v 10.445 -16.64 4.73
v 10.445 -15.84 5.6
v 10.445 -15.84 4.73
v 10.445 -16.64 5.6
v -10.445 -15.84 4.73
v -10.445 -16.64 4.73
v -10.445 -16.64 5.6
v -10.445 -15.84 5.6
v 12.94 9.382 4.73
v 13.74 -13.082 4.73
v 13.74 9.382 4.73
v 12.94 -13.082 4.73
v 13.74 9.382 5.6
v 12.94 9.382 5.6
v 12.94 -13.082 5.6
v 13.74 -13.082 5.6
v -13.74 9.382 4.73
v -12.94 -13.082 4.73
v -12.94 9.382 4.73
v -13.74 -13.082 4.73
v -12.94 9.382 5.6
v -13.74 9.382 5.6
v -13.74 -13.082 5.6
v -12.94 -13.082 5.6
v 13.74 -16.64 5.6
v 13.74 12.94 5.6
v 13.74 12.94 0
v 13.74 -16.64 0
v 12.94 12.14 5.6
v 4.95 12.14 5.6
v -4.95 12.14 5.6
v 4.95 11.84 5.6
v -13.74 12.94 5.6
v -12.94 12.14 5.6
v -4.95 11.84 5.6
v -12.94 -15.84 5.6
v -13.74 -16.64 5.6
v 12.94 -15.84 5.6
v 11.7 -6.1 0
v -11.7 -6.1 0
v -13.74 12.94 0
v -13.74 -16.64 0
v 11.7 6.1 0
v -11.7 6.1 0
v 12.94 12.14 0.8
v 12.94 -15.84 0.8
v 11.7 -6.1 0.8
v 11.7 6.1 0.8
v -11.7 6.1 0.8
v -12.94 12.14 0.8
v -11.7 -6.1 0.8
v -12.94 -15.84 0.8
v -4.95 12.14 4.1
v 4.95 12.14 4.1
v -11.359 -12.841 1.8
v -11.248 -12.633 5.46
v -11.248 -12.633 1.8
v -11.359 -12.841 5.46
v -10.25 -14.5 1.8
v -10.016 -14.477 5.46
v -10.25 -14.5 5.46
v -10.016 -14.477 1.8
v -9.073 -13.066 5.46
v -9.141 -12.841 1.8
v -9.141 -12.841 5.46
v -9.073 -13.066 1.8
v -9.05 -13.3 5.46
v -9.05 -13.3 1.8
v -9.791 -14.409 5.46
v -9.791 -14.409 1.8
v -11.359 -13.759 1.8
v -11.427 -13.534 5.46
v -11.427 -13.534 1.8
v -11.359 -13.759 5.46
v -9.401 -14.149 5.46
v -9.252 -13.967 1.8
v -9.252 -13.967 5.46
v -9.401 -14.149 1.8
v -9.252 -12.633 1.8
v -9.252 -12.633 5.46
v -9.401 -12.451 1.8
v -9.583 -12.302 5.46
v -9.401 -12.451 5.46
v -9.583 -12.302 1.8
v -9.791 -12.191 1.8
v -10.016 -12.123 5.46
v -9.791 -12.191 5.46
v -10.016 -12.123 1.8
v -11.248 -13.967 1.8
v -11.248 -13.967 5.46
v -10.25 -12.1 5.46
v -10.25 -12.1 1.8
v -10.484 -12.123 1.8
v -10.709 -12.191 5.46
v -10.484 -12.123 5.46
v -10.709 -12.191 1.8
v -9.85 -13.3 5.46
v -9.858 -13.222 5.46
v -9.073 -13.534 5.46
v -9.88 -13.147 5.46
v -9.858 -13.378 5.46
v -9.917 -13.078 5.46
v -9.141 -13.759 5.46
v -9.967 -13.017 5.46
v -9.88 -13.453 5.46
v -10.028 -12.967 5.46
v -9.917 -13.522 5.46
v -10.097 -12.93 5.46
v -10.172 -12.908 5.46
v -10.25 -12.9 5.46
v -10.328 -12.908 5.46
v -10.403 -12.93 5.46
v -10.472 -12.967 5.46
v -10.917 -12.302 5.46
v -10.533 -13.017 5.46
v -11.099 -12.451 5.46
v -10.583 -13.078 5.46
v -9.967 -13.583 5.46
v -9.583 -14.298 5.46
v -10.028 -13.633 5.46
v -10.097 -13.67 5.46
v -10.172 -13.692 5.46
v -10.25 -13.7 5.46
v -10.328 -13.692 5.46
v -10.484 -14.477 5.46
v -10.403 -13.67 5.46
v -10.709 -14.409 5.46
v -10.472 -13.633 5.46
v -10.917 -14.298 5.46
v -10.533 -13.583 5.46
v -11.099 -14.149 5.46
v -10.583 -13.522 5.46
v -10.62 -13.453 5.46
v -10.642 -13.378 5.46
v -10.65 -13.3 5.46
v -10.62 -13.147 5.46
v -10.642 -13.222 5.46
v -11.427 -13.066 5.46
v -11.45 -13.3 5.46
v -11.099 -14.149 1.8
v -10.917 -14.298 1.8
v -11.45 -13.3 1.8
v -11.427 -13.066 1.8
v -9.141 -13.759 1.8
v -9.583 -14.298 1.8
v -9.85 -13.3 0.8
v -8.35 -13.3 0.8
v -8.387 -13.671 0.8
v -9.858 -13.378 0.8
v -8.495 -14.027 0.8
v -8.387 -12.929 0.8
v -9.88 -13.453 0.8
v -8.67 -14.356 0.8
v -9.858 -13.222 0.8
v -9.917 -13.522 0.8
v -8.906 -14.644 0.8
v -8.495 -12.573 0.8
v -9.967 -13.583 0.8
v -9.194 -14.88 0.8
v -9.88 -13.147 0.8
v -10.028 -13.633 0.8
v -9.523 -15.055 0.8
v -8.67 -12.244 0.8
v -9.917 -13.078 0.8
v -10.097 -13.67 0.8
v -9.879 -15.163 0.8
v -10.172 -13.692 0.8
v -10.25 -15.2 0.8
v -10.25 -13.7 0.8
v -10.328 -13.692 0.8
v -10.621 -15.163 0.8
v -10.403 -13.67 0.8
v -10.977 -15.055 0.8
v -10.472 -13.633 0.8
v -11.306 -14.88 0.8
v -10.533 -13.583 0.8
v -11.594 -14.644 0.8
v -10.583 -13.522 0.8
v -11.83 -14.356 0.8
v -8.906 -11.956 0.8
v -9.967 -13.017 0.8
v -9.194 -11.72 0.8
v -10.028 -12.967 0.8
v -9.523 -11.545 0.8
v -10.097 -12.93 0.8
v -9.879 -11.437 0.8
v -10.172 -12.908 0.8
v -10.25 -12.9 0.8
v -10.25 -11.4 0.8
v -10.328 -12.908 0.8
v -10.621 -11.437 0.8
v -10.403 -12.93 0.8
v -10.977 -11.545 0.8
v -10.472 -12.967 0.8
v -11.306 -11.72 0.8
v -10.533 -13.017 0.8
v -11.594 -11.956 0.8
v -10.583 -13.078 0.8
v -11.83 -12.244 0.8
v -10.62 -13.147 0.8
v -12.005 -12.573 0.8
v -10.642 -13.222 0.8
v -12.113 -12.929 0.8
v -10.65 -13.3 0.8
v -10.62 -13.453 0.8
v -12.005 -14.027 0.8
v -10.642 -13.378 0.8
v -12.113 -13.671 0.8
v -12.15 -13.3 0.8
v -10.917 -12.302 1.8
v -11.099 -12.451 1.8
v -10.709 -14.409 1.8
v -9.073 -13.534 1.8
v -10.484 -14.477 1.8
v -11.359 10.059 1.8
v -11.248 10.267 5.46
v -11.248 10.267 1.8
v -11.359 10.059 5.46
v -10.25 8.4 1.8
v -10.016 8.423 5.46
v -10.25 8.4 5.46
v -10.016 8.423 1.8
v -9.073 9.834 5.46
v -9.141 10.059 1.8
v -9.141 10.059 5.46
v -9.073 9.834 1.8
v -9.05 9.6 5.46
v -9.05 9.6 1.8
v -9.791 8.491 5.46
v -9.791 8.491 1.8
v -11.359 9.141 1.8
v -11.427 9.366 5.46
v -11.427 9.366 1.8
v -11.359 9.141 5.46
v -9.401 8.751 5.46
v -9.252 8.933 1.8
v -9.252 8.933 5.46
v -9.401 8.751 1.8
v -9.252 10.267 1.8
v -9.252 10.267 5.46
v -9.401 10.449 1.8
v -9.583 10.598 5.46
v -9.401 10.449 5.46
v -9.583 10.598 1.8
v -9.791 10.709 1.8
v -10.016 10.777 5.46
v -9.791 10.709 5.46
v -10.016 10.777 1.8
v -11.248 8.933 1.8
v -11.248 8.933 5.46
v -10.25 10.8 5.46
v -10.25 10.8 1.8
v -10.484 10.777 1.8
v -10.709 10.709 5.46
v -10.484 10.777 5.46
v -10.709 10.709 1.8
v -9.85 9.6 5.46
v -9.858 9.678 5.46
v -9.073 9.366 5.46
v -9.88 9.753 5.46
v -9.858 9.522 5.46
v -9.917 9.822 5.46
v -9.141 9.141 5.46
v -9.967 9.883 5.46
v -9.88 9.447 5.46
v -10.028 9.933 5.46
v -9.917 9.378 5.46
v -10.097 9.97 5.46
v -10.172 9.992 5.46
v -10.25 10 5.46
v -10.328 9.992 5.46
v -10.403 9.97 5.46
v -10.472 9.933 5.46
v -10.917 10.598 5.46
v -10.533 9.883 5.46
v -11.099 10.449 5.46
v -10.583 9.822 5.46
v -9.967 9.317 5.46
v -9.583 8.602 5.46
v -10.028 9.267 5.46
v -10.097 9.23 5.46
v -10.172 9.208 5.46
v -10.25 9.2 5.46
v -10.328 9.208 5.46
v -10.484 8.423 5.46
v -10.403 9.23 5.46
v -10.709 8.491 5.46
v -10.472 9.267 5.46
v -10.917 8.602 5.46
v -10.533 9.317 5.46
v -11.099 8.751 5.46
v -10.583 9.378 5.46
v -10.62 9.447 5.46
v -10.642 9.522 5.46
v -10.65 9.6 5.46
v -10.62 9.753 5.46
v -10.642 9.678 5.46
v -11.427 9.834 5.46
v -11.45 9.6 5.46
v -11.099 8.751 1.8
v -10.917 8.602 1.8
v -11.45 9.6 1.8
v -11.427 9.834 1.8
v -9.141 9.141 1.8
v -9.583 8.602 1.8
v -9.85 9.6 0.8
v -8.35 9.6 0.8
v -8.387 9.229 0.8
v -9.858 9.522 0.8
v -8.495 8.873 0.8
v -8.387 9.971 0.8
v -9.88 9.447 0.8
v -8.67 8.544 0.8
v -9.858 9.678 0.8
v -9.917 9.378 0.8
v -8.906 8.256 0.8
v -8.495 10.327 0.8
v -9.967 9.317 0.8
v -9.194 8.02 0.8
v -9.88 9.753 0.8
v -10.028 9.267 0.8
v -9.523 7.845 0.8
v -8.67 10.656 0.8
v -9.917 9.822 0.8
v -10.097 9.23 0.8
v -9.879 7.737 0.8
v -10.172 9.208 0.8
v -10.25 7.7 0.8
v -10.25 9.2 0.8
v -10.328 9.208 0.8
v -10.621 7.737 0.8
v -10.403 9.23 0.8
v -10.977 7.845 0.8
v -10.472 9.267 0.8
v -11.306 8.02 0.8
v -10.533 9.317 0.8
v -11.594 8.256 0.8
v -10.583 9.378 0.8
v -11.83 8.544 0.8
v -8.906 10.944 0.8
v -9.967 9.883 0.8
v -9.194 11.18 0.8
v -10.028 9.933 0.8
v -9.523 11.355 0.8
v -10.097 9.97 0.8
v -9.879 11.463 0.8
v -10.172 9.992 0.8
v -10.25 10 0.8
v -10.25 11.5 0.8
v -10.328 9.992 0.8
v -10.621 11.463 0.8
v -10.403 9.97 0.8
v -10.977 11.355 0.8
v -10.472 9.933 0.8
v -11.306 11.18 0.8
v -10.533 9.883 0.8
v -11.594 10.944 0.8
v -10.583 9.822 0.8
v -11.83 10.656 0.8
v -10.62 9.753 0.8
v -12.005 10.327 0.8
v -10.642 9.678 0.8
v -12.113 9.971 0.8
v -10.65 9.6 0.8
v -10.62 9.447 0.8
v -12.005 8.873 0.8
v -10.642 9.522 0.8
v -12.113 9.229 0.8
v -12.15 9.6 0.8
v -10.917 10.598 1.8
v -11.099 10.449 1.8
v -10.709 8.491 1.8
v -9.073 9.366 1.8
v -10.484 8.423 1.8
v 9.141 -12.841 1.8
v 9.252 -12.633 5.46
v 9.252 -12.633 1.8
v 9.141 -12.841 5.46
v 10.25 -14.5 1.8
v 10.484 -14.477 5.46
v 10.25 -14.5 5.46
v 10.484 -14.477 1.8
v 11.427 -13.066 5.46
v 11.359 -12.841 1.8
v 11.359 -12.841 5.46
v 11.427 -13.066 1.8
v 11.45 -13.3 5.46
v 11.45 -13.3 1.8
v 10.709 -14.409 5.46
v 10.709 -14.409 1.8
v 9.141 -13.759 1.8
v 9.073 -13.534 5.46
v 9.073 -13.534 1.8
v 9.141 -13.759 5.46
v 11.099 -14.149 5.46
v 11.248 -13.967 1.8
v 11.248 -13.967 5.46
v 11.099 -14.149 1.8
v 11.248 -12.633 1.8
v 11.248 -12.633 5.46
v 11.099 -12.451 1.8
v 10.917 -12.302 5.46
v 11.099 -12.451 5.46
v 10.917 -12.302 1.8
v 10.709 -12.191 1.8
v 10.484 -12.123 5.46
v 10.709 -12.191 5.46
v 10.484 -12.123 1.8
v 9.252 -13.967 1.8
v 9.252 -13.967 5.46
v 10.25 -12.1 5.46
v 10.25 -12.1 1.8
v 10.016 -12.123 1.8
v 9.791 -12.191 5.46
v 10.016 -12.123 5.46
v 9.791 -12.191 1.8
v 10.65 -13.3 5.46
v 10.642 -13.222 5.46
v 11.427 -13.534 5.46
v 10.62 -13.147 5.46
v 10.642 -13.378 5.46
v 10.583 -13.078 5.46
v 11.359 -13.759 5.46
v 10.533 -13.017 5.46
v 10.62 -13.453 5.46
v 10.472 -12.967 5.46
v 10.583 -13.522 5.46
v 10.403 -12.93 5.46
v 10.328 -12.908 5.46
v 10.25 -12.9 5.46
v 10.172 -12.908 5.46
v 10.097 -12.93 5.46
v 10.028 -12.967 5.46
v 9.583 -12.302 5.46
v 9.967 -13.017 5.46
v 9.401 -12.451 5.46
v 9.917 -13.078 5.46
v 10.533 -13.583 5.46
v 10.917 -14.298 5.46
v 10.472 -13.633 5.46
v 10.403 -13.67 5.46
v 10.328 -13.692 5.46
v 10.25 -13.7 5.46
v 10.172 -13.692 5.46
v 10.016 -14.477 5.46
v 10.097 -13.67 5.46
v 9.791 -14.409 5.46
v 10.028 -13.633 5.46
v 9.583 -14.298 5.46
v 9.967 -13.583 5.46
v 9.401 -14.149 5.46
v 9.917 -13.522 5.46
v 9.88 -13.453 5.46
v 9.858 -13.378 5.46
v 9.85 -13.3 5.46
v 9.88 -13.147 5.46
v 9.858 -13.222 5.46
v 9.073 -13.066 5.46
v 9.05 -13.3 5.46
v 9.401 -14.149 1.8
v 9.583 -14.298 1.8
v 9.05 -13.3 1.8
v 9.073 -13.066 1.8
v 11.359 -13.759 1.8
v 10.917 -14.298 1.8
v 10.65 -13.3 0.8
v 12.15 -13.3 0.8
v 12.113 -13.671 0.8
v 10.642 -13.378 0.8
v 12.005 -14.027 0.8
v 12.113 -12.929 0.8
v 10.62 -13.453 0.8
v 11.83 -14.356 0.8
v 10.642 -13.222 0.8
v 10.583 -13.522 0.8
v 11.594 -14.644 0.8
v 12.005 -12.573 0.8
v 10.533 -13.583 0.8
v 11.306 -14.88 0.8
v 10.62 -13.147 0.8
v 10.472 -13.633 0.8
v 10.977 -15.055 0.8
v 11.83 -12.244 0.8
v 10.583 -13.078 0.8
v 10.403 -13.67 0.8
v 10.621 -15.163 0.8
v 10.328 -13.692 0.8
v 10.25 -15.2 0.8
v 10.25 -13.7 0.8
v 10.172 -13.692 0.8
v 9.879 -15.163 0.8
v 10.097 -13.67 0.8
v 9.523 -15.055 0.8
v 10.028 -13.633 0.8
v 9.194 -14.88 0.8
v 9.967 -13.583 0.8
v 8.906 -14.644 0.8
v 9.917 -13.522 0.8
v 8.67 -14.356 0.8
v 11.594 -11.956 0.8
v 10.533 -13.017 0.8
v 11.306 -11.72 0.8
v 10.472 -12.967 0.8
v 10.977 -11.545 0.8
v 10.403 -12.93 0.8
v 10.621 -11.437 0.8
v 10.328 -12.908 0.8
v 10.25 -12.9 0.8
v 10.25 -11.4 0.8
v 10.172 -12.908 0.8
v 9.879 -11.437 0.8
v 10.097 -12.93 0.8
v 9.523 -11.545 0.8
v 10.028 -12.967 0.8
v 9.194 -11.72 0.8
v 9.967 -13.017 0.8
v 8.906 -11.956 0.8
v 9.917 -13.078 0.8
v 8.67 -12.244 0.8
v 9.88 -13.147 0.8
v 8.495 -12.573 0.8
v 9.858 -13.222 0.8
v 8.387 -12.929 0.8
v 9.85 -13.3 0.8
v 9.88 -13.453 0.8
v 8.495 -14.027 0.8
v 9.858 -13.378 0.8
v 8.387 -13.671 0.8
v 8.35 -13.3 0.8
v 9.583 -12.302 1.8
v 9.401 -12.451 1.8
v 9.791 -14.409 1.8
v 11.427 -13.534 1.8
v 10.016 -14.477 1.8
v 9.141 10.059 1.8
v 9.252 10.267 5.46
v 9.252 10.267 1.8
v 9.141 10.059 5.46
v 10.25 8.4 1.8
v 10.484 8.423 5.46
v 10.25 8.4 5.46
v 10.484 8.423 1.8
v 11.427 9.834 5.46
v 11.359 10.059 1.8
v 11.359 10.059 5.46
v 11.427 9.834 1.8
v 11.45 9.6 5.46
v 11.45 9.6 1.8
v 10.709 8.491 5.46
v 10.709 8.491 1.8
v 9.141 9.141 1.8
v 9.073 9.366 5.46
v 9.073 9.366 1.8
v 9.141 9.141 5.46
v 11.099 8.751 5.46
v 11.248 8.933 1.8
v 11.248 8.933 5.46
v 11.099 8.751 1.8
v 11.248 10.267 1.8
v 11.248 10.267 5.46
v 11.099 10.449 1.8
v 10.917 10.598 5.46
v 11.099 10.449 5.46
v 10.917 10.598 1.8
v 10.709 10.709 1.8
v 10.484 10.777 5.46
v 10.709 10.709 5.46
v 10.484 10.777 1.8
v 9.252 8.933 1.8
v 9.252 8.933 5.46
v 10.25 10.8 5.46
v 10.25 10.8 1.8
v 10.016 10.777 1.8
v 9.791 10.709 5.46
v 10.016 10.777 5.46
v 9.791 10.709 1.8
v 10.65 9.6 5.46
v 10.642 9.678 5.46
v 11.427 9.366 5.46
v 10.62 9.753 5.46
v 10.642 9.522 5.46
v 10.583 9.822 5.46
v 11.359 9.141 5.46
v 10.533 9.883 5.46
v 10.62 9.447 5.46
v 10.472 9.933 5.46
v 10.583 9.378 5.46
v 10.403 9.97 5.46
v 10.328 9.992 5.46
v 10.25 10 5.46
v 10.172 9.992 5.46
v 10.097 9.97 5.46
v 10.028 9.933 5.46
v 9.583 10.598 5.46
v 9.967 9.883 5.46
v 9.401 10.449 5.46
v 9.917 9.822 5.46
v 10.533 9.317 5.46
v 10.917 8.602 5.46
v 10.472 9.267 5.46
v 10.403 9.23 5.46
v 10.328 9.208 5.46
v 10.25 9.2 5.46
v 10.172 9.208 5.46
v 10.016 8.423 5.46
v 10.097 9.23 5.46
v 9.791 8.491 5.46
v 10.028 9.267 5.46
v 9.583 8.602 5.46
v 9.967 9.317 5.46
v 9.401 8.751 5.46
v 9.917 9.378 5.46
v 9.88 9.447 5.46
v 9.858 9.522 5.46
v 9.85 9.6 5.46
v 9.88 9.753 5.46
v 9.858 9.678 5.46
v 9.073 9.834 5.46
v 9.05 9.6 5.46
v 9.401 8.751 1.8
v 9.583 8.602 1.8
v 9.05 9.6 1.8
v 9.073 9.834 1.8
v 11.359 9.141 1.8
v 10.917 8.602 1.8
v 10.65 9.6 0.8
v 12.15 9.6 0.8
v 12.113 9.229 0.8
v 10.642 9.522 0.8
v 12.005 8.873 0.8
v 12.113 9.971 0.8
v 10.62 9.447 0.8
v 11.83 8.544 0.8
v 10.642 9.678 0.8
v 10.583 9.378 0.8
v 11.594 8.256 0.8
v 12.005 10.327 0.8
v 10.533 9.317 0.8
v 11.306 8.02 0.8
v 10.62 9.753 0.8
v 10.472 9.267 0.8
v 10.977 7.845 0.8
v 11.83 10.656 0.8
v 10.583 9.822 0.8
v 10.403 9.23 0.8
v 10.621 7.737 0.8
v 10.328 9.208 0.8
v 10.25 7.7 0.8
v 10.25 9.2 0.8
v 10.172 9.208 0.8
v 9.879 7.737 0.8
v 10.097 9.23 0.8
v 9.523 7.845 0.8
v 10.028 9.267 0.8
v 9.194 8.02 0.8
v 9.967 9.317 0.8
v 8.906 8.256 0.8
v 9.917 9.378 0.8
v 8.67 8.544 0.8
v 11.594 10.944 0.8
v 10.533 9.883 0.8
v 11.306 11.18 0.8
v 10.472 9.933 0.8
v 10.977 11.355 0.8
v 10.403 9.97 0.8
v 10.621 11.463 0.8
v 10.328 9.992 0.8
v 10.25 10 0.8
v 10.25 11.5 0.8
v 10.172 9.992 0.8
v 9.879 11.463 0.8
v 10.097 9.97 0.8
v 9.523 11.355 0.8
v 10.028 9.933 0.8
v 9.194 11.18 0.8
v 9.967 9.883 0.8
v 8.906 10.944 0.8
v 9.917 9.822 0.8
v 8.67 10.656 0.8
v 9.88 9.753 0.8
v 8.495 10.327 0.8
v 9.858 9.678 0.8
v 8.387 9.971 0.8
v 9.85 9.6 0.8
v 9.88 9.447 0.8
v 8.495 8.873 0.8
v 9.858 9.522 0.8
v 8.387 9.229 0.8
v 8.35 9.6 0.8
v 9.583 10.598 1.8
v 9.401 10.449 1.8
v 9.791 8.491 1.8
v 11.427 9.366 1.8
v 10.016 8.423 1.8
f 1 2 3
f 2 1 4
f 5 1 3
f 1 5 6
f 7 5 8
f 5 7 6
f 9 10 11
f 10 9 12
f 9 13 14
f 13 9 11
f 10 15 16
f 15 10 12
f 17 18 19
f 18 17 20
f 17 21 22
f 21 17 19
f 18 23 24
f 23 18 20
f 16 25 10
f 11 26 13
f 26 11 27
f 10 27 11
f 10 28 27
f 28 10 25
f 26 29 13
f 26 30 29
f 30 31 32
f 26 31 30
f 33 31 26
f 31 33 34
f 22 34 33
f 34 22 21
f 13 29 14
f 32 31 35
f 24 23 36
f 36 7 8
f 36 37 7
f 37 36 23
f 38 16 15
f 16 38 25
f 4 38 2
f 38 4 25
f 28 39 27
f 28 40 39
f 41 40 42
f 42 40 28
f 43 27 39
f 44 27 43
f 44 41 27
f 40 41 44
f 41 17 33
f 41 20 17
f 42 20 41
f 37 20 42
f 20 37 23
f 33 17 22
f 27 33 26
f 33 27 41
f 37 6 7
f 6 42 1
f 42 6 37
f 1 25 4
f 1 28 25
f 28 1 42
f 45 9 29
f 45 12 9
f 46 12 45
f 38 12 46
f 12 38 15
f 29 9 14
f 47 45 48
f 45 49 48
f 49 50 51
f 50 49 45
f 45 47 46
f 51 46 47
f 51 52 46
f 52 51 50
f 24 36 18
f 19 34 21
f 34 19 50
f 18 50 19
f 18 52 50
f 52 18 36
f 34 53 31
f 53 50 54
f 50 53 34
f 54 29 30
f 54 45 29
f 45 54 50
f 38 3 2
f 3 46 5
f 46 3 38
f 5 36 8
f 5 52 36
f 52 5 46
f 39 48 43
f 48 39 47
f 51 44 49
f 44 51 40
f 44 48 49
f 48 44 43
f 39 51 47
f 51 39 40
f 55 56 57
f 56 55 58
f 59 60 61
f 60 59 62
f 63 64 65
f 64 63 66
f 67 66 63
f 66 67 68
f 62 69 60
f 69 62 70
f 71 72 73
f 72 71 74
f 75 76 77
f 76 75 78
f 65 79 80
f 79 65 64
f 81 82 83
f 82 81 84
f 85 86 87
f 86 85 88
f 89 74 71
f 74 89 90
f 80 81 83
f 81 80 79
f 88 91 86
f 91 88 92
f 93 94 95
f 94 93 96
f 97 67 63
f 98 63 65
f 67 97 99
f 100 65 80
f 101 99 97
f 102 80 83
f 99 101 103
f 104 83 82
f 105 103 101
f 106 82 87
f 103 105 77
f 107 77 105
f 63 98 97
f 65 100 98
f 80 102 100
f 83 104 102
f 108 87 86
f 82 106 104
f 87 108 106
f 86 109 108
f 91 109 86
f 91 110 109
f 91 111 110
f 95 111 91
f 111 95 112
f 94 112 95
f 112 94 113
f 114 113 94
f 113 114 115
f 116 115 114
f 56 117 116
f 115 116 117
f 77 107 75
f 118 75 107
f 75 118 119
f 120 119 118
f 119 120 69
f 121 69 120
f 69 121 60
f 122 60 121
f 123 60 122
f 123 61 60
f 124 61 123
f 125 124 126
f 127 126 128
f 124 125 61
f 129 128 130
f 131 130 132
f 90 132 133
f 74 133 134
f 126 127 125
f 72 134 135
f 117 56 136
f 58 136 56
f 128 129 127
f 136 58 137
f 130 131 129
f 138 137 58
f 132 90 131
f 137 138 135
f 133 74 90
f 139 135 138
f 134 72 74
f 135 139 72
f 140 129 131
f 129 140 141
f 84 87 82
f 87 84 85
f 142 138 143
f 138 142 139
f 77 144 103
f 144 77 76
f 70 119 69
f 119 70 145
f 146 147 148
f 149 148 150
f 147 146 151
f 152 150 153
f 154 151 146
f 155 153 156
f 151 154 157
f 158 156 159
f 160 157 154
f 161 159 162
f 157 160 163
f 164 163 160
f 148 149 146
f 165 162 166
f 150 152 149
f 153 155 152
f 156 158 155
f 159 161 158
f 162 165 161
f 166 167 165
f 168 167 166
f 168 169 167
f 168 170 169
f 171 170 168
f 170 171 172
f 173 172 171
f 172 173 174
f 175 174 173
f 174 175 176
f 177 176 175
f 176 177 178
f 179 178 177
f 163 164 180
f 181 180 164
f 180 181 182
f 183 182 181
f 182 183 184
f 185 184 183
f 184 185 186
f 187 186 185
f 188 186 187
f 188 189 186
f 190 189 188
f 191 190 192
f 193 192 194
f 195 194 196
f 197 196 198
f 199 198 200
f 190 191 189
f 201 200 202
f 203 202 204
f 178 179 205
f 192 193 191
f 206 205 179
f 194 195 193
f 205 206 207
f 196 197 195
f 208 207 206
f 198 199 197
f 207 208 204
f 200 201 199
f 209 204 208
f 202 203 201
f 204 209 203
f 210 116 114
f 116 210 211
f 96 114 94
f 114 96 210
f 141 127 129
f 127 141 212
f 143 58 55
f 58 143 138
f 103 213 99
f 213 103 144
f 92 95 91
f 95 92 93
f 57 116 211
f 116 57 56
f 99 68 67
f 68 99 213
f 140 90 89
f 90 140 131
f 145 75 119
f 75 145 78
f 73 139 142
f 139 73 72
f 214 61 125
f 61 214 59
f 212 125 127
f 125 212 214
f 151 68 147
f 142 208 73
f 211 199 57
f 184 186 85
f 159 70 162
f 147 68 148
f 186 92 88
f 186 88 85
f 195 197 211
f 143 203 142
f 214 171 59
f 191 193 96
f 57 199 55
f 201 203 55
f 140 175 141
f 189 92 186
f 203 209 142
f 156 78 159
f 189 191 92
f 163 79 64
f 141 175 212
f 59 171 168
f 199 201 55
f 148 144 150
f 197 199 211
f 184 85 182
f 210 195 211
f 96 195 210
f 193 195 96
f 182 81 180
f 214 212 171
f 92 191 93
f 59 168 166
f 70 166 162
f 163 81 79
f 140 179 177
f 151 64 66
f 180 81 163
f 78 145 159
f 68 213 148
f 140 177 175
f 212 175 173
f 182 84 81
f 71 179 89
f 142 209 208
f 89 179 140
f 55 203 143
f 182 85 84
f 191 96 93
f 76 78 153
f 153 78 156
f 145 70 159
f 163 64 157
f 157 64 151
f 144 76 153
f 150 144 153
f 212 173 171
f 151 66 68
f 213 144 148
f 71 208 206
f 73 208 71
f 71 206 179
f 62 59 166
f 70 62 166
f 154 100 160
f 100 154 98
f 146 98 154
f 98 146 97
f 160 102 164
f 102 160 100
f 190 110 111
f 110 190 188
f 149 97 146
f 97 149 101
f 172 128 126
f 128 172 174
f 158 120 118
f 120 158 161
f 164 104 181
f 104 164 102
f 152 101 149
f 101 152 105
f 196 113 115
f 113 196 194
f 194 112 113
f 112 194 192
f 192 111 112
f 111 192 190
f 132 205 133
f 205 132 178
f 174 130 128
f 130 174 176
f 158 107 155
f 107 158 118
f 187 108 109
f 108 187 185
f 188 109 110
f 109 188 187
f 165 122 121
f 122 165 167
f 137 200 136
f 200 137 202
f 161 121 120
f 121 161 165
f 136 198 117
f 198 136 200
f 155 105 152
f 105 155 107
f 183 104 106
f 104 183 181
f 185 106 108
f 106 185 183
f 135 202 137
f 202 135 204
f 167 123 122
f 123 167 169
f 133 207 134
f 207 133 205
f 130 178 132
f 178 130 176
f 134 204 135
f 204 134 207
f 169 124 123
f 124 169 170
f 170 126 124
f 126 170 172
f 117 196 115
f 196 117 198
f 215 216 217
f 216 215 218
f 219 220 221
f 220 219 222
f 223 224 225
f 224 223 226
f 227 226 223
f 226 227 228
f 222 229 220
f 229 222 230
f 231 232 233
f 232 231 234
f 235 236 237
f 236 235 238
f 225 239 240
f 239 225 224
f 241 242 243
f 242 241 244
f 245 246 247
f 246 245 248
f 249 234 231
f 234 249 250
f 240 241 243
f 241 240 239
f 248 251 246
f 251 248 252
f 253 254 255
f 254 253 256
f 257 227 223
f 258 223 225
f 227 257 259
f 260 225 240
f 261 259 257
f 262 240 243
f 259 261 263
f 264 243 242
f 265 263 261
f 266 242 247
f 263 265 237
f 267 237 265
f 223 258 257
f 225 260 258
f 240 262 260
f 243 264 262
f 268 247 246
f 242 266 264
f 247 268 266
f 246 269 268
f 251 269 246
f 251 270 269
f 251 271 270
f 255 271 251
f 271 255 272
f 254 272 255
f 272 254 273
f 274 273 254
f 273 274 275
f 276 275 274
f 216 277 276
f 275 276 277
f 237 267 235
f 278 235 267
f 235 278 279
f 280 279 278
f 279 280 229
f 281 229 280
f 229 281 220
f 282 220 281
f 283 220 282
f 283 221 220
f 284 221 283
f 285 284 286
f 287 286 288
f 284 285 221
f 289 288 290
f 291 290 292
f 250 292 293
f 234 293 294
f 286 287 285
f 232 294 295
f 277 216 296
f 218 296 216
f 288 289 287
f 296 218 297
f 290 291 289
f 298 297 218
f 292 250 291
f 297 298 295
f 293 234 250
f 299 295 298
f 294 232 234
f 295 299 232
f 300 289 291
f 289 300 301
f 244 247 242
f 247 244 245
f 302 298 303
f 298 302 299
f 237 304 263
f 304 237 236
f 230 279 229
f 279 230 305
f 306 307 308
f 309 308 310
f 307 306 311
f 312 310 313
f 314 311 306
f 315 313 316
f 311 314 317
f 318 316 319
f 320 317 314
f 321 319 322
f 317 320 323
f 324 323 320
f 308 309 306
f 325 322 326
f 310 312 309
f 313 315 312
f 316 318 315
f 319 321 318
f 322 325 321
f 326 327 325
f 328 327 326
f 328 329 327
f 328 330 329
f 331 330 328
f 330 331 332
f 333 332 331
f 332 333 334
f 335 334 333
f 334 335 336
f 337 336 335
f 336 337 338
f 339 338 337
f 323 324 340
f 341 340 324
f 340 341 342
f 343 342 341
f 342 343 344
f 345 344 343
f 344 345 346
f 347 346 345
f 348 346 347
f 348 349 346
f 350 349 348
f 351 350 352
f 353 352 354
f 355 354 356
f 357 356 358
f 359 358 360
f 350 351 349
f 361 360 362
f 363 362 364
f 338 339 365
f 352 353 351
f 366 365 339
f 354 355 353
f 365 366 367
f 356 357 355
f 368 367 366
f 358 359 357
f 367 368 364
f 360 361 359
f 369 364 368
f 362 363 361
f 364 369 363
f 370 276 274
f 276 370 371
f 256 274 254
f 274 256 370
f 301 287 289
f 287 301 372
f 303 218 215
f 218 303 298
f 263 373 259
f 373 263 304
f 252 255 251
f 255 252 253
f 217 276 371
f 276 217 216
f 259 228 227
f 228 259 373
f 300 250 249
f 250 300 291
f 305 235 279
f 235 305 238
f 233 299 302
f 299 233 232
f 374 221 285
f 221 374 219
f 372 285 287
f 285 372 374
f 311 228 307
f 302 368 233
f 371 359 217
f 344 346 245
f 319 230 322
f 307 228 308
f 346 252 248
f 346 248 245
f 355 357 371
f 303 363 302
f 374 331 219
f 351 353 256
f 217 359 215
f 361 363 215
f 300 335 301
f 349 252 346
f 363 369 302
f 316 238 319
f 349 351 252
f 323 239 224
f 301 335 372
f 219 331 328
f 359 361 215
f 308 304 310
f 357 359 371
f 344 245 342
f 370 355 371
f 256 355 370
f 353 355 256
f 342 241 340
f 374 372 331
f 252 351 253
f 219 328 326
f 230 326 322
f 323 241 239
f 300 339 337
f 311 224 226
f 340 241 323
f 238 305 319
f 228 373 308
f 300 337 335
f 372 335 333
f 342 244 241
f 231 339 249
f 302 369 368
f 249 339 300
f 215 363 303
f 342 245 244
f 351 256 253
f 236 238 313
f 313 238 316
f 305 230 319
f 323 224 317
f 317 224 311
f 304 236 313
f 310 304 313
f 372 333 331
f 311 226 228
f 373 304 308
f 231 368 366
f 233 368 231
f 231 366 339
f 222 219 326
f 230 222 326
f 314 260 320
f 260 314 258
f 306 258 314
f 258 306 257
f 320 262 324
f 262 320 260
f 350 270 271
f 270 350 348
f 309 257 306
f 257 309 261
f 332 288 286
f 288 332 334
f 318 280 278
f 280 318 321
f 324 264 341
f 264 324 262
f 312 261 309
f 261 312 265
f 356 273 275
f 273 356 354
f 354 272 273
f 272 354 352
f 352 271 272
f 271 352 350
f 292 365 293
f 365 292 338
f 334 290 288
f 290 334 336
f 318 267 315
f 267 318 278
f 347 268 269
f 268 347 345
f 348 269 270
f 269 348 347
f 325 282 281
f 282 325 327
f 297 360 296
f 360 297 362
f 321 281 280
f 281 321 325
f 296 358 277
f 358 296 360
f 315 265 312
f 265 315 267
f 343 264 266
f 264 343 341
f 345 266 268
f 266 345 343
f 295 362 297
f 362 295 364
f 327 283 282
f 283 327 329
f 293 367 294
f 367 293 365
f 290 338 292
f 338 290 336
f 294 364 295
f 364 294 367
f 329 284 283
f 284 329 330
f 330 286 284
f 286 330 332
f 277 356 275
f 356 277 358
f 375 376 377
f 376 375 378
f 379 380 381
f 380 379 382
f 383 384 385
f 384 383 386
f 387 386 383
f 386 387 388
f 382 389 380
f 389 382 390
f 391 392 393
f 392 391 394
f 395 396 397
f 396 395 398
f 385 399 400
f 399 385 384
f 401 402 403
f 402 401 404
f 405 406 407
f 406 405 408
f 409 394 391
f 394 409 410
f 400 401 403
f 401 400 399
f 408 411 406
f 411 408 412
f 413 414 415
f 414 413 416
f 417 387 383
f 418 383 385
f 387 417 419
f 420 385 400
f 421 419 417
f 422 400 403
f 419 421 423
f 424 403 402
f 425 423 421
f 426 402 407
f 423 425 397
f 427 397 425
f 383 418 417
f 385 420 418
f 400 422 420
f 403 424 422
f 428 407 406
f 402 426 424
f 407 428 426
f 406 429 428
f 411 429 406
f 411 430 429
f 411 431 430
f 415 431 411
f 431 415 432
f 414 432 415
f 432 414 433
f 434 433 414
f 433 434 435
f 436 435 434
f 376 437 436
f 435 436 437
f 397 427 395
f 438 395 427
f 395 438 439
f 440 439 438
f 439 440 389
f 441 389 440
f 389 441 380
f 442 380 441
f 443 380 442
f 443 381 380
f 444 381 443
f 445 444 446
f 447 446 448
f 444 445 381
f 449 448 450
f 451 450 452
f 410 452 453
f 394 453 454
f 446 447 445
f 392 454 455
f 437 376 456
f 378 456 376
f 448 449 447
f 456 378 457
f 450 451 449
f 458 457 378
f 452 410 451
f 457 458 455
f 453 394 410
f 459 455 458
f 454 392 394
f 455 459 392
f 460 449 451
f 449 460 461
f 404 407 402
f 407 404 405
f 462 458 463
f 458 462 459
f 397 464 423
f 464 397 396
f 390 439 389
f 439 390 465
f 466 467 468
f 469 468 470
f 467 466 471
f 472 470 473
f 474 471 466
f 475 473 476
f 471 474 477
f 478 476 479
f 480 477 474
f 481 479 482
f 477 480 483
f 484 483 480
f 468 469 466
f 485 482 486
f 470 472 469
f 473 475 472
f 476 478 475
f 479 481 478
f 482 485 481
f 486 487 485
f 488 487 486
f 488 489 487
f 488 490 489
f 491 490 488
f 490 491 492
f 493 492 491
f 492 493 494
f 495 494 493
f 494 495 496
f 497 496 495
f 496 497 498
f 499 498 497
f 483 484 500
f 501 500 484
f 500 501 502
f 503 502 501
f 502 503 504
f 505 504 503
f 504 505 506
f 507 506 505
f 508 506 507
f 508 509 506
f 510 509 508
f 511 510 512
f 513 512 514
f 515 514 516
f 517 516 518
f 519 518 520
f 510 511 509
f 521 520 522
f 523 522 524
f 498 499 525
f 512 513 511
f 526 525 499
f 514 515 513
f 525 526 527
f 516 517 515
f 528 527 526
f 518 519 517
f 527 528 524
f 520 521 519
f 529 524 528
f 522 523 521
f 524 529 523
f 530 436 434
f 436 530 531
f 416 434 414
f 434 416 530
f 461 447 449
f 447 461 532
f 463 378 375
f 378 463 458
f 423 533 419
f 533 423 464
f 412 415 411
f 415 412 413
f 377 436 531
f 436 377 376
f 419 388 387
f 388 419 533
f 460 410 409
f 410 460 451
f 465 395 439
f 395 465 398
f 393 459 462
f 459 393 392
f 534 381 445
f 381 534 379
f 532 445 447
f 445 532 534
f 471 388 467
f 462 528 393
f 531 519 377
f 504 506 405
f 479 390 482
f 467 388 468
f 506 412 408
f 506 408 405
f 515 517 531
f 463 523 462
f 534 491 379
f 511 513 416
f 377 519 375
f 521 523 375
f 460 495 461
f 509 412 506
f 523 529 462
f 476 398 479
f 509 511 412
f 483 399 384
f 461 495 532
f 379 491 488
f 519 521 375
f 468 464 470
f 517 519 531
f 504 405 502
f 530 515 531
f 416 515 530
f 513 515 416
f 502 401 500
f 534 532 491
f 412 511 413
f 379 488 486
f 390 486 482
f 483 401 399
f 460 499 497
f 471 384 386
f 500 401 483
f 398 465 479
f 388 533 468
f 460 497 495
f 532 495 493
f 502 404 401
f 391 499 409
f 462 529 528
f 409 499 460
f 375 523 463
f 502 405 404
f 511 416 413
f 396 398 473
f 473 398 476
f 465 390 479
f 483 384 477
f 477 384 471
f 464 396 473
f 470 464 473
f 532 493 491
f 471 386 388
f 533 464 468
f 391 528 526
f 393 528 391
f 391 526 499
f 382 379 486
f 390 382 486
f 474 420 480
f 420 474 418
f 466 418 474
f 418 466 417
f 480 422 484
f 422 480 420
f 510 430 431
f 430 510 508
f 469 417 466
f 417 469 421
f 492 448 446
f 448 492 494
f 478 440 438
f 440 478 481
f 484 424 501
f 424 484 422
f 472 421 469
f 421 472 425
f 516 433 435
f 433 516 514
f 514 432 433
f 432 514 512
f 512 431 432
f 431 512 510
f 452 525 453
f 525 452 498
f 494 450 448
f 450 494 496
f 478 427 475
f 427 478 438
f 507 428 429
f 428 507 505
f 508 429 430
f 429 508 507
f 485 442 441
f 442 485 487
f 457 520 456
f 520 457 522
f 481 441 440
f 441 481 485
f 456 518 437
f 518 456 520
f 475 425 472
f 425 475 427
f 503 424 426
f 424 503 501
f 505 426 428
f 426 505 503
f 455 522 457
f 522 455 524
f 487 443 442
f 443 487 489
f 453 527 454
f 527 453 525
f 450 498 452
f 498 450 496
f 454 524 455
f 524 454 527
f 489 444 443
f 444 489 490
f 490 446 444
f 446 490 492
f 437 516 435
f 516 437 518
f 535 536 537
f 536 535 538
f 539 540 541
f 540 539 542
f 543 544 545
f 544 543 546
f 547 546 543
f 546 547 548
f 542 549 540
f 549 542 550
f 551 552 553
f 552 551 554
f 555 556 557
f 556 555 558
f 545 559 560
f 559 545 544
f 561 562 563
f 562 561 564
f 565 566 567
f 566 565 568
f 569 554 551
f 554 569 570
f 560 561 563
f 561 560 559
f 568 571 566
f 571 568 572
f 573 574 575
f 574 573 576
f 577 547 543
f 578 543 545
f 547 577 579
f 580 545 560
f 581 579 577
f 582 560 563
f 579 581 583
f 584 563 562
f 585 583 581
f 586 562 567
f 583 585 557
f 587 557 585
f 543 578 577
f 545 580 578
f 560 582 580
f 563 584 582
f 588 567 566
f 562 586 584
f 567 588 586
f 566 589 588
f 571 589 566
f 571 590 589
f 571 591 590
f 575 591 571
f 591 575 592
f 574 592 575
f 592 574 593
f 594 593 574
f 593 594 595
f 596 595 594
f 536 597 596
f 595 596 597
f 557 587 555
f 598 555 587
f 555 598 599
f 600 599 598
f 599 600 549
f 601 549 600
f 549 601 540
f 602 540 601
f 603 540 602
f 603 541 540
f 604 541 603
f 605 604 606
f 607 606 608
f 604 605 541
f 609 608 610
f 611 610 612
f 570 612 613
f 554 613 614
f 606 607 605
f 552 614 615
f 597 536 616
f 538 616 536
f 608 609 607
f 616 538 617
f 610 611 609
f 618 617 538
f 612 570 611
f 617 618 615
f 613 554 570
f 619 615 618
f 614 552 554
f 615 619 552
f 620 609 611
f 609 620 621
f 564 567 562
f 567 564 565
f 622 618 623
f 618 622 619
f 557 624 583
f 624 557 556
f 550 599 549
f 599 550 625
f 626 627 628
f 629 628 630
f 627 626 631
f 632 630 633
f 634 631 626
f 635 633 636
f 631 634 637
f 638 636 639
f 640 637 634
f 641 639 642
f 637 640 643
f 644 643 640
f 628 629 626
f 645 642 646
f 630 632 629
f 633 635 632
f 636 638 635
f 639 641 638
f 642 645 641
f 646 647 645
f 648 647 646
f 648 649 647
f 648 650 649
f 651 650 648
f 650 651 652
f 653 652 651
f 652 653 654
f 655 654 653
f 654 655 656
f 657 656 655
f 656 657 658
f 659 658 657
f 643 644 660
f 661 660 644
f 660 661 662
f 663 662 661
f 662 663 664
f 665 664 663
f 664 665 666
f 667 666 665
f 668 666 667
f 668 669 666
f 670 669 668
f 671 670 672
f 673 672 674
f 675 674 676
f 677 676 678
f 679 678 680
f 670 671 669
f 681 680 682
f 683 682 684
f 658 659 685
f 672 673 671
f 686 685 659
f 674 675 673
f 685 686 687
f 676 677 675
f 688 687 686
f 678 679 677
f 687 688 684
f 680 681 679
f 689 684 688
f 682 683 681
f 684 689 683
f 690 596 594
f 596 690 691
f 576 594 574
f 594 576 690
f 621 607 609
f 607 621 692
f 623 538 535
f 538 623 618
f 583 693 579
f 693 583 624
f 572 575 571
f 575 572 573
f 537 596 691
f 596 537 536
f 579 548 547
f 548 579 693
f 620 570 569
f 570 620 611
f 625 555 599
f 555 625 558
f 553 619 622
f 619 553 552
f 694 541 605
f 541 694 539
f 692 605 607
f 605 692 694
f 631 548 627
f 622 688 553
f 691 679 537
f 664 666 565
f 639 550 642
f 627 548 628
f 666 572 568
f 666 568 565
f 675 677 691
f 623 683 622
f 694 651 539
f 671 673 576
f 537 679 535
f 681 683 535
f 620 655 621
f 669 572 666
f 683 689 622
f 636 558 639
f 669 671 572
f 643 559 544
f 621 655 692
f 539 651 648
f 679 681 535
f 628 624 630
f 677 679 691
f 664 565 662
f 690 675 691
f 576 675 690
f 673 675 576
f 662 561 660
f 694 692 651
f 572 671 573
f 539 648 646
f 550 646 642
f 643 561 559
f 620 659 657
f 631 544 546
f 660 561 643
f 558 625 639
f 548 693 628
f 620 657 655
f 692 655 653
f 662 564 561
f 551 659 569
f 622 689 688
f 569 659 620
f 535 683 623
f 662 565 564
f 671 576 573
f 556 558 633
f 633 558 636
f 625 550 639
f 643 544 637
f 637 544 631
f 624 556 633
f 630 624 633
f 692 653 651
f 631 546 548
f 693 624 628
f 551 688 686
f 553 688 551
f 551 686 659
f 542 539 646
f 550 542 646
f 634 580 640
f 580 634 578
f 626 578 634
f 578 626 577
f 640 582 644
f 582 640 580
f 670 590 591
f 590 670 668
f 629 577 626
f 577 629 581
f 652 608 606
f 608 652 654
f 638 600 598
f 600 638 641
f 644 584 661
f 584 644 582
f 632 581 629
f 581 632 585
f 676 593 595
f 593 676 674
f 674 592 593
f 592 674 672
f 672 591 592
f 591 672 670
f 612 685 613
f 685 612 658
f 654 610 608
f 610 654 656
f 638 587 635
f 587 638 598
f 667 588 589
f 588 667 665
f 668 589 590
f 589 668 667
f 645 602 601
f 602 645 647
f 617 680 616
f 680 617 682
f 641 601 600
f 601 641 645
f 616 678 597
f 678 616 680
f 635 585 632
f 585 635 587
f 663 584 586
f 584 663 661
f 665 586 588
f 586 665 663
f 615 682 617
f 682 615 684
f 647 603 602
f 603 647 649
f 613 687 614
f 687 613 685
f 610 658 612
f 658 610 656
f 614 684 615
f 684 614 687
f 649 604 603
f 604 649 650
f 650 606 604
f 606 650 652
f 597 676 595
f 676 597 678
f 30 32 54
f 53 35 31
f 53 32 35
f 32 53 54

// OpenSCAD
// file: oled_case_params.scad
display_x = 24.8;
display_y = 26.9;
window_x = 23.4;
window_y = 12.2;
pin_to_window_top = 3.5;
pin_to_window_bottom = 7.2;
pin_dist_x = 20.5;
nozzle_dia = 0.4;
side_wall_th = nozzle_dia * 2;
front_th = 0.8;
back_th = 0.8;
print_margin = 0.14;
eps = 0.01;
extra_space = 0.4;
inner_space = 4.0;
case_height = front_th + inner_space + back_th;
inner_x = display_x + (print_margin * 2) + (extra_space * 2);
inner_y = display_y + (print_margin * 2) + (extra_space * 2);
top_pin_y = (window_y / 2) + pin_to_window_top;
bottom_pin_y = -(window_y / 2) - pin_to_window_bottom;
pocket_center_y = (top_pin_y + bottom_pin_y) / 2;
outer_x = inner_x + (side_wall_th * 2);
outer_y = inner_y + (side_wall_th * 2);
pin_dia = 2.4;
tab_depth = 0.8;
pin_height = inner_space + tab_depth - print_margin;
flare_height = 1.0;
flare_dia = pin_dia + 1.4;
pin_hole_dia = 0.8;
pin_hole_depth = pin_height - flare_height - 0.3;
tab_pocket_width = tab_depth + (print_margin * 2);
pocket_height = tab_depth + print_margin;

lid_clearance = 0.18;
lid_x = outer_x;
lid_y = outer_y;
cutout_depth = 4.1 + (print_margin * 2);
cutout_width = 9.8 + (print_margin * 2);
recess_dia = 3.5;
recess_depth = 0.2;
recess_pos_x = 1.2;
recess_pos_y = 2.3;
edge_length_factor = 0.75;

filler_extension = 0.3;
filler_height = 1.5;
filler_y_pos = pocket_center_y + (inner_y / 2);
filler_width = cutout_width - lid_clearance;
// main file
include <oled_case_params.scad>

module outer_shell() {
    translate([0, pocket_center_y, case_height / 2])
        cube([outer_x, outer_y, case_height], center=true);
}

module inner_pocket() {
    translate([0, pocket_center_y, front_th + (case_height / 2)])
        cube([inner_x, inner_y, case_height], center=true);
}

module display_window() {
    cube([window_x, window_y, side_wall_th * 3], center=true);
}

module mounting_pins() {
    for (px = [-pin_dist_x/2, pin_dist_x/2], py = [bottom_pin_y, top_pin_y]) {
        translate([px, py, front_th]) 
        difference() {
            union() {
                cylinder(h = pin_height, d = pin_dia, $fn = 32);
                cylinder(h = flare_height, d1 = flare_dia, d2 = pin_dia, $fn = 32);
            }
            translate([0, 0, -eps])
                cylinder(d = pin_hole_dia, h = pin_height + 0.2, $fn = 32);
        }
    }
}

module gap_filler() {
    translate([0, filler_y_pos, case_height])
    rotate([0, -90, 0])
    linear_extrude(height = filler_width, center = true)
    polygon(points=[[0,0], [0, -filler_extension], [-filler_height, 0]]);
}

module lid_locking_recesses() {
    translate([0, pocket_center_y - (lid_y / 2) + (tab_depth / 2), case_height - (tab_depth / 2)])
        cube([(lid_x * edge_length_factor) + (print_margin * 2), tab_pocket_width, pocket_height], center = true);
    translate([(lid_x / 2) - (tab_depth / 2), pocket_center_y, case_height - (tab_depth / 2)])
        cube([tab_pocket_width, (lid_y * edge_length_factor) + (print_margin * 2), pocket_height], center = true);
    translate([(-lid_x / 2) + (tab_depth / 2), pocket_center_y, case_height - (tab_depth / 2)])
        cube([tab_pocket_width, (lid_y * edge_length_factor) + (print_margin * 2), pocket_height], center = true);
}

module display_case_assembly() {
    union() {
        difference() {
            outer_shell();
            inner_pocket();
            display_window();
            lid_locking_recesses();
        }
        mounting_pins();
        gap_filler();
    }
}

//projection(cut = true) 
//translate([0, 0, -1]) 
display_case_assembly();
